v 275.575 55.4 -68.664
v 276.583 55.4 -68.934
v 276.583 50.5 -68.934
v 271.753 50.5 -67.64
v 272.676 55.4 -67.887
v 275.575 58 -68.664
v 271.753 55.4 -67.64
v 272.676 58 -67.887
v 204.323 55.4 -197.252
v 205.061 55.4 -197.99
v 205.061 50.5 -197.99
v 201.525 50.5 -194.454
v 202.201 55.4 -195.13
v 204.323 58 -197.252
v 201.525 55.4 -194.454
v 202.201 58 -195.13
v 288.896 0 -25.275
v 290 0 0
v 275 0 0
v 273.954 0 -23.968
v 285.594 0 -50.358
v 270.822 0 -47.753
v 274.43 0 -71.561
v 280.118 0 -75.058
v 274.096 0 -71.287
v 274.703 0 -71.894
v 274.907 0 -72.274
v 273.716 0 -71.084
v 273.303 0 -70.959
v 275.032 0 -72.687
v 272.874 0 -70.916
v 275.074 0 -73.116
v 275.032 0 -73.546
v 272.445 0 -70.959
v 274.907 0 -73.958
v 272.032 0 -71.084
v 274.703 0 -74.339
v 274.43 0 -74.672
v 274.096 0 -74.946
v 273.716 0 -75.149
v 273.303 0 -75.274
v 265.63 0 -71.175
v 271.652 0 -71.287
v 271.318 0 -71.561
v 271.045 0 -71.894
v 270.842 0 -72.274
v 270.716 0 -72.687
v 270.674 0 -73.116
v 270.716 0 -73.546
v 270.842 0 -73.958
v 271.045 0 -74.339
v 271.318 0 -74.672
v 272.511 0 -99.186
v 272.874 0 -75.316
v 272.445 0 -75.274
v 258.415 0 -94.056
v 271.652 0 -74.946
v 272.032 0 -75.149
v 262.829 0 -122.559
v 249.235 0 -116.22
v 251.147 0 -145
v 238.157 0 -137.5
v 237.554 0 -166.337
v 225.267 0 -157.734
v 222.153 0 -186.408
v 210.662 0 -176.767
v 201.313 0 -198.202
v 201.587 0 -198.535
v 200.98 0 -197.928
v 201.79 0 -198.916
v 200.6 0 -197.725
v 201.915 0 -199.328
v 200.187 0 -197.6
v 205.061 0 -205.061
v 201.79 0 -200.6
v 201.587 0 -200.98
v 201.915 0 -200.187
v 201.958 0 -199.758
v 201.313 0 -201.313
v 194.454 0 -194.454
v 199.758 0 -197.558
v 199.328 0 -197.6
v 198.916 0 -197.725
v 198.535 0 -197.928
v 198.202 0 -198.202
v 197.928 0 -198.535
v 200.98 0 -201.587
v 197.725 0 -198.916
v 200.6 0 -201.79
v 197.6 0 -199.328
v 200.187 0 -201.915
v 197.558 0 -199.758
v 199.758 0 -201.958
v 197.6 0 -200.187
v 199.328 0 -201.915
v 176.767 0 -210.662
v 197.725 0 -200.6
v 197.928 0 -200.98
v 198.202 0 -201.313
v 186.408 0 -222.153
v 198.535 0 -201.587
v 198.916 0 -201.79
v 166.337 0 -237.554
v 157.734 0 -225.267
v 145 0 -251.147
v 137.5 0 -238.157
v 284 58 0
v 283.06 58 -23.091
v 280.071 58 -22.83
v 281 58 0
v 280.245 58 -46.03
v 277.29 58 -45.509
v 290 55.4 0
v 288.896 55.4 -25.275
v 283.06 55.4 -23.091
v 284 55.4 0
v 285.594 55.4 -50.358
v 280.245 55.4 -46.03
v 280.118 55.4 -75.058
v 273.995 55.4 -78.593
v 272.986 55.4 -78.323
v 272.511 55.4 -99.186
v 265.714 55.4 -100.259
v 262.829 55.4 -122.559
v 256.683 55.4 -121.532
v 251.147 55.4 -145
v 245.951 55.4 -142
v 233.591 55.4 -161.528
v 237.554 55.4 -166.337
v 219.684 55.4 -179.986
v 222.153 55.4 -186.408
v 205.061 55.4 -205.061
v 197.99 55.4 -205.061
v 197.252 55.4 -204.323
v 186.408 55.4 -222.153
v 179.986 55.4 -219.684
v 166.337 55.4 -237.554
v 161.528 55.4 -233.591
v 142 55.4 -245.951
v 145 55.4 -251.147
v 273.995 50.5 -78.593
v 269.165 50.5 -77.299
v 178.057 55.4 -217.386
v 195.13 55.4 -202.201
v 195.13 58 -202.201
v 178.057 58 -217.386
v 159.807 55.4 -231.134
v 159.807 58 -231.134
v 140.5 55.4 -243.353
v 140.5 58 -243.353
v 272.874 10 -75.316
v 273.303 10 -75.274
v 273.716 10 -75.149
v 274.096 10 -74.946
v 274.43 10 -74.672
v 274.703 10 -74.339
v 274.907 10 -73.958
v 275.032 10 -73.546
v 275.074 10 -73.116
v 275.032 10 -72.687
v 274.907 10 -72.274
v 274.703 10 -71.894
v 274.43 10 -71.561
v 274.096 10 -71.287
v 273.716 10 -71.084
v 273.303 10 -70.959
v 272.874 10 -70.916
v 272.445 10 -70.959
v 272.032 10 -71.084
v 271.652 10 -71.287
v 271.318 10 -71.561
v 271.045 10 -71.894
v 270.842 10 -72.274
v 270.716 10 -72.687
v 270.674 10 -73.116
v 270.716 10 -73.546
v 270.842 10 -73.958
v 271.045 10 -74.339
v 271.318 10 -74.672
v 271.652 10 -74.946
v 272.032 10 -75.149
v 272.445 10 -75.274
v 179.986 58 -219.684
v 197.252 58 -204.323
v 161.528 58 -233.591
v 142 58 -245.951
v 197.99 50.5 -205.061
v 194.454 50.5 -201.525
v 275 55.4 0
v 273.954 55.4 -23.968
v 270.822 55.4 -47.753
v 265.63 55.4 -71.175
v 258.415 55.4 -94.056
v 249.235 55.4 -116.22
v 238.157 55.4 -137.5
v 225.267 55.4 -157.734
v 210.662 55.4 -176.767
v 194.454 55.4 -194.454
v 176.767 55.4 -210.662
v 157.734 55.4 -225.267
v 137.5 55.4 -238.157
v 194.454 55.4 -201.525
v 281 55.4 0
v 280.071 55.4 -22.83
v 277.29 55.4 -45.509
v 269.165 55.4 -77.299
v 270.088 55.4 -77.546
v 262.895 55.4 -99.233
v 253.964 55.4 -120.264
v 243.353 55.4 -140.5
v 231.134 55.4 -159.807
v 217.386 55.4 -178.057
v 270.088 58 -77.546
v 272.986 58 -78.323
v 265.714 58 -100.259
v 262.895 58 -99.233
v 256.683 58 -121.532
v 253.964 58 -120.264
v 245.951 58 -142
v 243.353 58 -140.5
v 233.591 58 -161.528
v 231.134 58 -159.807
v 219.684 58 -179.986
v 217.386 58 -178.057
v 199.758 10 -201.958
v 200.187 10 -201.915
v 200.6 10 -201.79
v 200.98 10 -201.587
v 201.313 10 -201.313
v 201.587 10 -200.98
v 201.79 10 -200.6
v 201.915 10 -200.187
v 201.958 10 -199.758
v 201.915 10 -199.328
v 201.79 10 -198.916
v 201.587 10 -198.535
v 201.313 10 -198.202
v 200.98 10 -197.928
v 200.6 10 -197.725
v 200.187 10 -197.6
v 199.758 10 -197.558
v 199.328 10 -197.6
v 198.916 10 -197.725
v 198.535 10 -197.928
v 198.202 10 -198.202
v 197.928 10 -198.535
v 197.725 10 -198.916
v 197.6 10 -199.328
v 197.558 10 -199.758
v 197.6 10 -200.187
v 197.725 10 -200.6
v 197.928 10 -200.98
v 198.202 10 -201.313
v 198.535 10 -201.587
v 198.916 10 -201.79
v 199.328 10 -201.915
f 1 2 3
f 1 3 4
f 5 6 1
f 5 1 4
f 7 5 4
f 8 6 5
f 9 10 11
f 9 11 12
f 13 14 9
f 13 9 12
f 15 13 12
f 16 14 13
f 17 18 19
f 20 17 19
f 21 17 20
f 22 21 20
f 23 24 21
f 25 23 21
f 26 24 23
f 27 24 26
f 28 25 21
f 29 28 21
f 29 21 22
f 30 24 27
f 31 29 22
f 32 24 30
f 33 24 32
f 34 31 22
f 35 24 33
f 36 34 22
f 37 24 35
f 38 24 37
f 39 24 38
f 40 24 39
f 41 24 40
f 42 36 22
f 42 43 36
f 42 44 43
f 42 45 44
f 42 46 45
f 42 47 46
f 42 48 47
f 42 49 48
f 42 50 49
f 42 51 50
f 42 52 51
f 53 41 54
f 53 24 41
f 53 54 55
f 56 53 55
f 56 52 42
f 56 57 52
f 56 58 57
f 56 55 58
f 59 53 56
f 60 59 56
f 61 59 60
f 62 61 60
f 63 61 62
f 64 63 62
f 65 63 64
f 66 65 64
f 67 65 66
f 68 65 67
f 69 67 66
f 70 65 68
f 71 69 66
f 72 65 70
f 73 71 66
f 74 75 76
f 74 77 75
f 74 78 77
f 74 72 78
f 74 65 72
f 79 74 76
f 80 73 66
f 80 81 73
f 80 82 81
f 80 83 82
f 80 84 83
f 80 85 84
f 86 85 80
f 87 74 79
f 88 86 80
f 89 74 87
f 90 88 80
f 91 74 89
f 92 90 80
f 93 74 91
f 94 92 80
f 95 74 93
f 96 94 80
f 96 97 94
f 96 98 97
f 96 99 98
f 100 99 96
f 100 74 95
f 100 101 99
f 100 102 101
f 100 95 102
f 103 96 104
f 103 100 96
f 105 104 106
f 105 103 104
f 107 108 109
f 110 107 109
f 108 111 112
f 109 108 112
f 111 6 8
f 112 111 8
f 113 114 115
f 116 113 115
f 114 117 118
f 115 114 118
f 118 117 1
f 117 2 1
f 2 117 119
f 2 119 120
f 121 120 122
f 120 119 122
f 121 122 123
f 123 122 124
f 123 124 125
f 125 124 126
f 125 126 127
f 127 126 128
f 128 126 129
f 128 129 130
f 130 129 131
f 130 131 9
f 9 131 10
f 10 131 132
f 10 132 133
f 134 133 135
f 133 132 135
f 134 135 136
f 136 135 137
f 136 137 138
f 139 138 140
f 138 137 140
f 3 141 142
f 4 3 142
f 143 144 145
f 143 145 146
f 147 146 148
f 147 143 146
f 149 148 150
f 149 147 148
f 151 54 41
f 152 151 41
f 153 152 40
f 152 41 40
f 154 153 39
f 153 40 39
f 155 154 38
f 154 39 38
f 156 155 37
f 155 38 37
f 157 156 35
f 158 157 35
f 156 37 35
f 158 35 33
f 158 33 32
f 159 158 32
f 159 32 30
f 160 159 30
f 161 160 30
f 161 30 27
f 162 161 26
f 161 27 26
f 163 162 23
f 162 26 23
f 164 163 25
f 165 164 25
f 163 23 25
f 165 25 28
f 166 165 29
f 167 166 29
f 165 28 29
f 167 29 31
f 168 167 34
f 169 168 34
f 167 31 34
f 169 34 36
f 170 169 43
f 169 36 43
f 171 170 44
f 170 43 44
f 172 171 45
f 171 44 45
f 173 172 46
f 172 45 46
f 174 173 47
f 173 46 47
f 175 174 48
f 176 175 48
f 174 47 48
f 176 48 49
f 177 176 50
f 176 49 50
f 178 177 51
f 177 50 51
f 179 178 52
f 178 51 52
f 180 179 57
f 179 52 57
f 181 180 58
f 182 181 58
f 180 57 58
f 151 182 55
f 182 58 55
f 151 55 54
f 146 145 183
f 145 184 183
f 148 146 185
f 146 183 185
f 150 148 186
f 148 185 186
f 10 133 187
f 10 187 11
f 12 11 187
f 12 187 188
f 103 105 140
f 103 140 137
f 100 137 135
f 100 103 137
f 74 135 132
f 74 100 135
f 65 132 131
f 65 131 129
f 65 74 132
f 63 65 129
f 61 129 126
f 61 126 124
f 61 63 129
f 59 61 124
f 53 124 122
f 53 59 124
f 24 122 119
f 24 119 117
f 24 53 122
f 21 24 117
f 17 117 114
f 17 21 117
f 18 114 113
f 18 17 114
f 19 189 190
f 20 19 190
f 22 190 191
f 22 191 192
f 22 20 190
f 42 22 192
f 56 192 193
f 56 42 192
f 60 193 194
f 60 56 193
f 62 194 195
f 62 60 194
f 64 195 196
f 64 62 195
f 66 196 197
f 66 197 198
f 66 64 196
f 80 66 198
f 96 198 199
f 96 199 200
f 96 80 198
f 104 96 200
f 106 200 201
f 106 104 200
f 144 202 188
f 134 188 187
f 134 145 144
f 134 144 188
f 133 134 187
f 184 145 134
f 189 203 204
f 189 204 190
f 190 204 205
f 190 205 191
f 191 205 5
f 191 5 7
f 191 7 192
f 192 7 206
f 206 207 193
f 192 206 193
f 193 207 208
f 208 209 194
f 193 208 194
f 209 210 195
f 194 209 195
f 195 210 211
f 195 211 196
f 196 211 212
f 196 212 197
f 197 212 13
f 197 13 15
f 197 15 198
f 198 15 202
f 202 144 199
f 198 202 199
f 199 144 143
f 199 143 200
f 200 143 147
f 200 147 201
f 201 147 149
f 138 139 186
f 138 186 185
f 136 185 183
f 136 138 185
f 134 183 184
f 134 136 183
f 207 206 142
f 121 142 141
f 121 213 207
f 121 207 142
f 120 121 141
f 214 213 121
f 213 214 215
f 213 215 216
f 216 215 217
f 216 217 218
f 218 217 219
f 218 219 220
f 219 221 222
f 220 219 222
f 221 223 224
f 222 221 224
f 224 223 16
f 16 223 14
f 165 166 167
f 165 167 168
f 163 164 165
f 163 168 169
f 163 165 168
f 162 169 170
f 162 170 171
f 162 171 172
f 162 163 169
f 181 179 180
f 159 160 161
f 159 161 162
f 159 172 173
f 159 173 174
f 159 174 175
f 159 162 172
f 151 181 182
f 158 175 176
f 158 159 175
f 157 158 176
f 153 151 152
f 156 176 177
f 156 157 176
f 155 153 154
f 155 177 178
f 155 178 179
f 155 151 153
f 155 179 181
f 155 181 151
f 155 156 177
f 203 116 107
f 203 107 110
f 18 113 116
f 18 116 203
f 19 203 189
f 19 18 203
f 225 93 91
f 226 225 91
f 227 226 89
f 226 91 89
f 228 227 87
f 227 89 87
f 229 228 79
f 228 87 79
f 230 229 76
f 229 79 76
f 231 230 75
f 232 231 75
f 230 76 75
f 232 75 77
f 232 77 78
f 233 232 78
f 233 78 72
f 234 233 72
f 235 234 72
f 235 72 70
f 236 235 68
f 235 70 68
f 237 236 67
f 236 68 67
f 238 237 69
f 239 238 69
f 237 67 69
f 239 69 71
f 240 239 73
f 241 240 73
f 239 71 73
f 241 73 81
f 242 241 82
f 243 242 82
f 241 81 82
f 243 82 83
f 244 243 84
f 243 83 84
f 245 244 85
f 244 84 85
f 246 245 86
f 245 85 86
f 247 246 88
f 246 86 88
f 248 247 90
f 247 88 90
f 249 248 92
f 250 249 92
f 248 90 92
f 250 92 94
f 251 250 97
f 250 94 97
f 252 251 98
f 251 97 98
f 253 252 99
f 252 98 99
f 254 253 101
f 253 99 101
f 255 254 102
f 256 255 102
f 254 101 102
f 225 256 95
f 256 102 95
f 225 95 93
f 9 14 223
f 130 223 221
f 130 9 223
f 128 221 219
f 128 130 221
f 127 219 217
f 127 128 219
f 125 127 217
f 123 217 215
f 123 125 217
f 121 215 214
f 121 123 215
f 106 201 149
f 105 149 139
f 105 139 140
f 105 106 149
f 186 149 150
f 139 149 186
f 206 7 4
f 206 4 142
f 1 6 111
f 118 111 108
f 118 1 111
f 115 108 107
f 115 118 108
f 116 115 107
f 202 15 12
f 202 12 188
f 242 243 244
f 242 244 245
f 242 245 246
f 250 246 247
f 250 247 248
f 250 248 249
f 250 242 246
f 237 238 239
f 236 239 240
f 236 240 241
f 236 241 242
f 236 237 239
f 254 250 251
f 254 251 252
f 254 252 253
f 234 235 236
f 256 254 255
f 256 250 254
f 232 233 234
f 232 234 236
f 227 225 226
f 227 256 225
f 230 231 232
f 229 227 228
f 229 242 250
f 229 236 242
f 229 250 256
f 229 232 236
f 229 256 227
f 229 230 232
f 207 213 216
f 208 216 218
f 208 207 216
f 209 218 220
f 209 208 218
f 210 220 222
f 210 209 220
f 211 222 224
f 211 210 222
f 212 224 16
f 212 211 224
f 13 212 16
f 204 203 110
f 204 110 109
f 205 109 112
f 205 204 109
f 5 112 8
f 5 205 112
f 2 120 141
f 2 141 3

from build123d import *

# Parameters (mm, degrees)
AUFSATZ_LINEAR_AUSTRAGEN1_DEPTH = 55.4
AUFSATZ_LINEAR_AUSTRAGEN2_DEPTH = 2.6
SCHNITT_LINEAR_AUSTRAGEN1_DEPTH = 7.5
SKIZZE4_R                       = 2.2
SCHNITT_LINEAR_AUSTRAGEN2_DEPTH = 10


with BuildPart() as part:
    # Skizze1 → Aufsatz-Linear austragen1 (new body)
    with BuildSketch(Plane(origin=(0, 0, 0), x_dir=(1, 0, 0), z_dir=(0, 1, 0))):
        with BuildLine():
            Line((137.5, 238.156986041), (145, 251.147367097))
            ThreePointArc((145, 251.147367097), (251.147367097, 145), (290, 0))
            Line((290, 0), (275, 0))
            ThreePointArc((275, 0), (238.156986041, 137.5), (137.5, 238.156986041))
        make_face()
    extrude(amount=AUFSATZ_LINEAR_AUSTRAGEN1_DEPTH)

    # Skizze2 → Aufsatz-Linear austragen2 (add)
    with BuildSketch(Plane(origin=(0, 55.4, 0), x_dir=(1, 0, 0), z_dir=(0, 1, 0))):
        with BuildLine():
            Line((140.5, 243.353138463), (142, 245.951214675))
            ThreePointArc((142, 245.951214675), (245.951214675, 142), (284, 0))
            Line((284, 0), (281, 0))
            ThreePointArc((281, 0), (243.353138463, 140.5), (140.5, 243.353138463))
        make_face()
    extrude(amount=AUFSATZ_LINEAR_AUSTRAGEN2_DEPTH)

    # Skizze3 → Schnitt-Linear austragen1 (cut)
    with BuildSketch(Plane(origin=(0, 58, 0), x_dir=(1, 0, 0), z_dir=(0, 1, 0))):
        Polygon((269.165136135, 77.29896176), (273.994765267, 78.593056986), (276.582955718, 68.933798723), (271.753326586, 67.639703497), align=None)
        Polygon((194.454364826, 201.525432638), (197.989898732, 205.060966544), (205.060966544, 197.989898732), (201.525432638, 194.454364826), align=None)
    extrude(amount=-SCHNITT_LINEAR_AUSTRAGEN1_DEPTH, mode=Mode.SUBTRACT)

    # Skizze4 → Schnitt-Linear austragen2 (cut)
    with BuildSketch(Plane.XZ):
        with Locations(Location((199.757665685, -199.757665685, 0), (0, 0, 270))):
            Circle(SKIZZE4_R)
        with Locations(Location((272.874045927, -73.116380241, 0), (0, 0, 270))):
            Circle(SKIZZE4_R)
    extrude(amount=-SCHNITT_LINEAR_AUSTRAGEN2_DEPTH, mode=Mode.SUBTRACT)


solid = part.part
